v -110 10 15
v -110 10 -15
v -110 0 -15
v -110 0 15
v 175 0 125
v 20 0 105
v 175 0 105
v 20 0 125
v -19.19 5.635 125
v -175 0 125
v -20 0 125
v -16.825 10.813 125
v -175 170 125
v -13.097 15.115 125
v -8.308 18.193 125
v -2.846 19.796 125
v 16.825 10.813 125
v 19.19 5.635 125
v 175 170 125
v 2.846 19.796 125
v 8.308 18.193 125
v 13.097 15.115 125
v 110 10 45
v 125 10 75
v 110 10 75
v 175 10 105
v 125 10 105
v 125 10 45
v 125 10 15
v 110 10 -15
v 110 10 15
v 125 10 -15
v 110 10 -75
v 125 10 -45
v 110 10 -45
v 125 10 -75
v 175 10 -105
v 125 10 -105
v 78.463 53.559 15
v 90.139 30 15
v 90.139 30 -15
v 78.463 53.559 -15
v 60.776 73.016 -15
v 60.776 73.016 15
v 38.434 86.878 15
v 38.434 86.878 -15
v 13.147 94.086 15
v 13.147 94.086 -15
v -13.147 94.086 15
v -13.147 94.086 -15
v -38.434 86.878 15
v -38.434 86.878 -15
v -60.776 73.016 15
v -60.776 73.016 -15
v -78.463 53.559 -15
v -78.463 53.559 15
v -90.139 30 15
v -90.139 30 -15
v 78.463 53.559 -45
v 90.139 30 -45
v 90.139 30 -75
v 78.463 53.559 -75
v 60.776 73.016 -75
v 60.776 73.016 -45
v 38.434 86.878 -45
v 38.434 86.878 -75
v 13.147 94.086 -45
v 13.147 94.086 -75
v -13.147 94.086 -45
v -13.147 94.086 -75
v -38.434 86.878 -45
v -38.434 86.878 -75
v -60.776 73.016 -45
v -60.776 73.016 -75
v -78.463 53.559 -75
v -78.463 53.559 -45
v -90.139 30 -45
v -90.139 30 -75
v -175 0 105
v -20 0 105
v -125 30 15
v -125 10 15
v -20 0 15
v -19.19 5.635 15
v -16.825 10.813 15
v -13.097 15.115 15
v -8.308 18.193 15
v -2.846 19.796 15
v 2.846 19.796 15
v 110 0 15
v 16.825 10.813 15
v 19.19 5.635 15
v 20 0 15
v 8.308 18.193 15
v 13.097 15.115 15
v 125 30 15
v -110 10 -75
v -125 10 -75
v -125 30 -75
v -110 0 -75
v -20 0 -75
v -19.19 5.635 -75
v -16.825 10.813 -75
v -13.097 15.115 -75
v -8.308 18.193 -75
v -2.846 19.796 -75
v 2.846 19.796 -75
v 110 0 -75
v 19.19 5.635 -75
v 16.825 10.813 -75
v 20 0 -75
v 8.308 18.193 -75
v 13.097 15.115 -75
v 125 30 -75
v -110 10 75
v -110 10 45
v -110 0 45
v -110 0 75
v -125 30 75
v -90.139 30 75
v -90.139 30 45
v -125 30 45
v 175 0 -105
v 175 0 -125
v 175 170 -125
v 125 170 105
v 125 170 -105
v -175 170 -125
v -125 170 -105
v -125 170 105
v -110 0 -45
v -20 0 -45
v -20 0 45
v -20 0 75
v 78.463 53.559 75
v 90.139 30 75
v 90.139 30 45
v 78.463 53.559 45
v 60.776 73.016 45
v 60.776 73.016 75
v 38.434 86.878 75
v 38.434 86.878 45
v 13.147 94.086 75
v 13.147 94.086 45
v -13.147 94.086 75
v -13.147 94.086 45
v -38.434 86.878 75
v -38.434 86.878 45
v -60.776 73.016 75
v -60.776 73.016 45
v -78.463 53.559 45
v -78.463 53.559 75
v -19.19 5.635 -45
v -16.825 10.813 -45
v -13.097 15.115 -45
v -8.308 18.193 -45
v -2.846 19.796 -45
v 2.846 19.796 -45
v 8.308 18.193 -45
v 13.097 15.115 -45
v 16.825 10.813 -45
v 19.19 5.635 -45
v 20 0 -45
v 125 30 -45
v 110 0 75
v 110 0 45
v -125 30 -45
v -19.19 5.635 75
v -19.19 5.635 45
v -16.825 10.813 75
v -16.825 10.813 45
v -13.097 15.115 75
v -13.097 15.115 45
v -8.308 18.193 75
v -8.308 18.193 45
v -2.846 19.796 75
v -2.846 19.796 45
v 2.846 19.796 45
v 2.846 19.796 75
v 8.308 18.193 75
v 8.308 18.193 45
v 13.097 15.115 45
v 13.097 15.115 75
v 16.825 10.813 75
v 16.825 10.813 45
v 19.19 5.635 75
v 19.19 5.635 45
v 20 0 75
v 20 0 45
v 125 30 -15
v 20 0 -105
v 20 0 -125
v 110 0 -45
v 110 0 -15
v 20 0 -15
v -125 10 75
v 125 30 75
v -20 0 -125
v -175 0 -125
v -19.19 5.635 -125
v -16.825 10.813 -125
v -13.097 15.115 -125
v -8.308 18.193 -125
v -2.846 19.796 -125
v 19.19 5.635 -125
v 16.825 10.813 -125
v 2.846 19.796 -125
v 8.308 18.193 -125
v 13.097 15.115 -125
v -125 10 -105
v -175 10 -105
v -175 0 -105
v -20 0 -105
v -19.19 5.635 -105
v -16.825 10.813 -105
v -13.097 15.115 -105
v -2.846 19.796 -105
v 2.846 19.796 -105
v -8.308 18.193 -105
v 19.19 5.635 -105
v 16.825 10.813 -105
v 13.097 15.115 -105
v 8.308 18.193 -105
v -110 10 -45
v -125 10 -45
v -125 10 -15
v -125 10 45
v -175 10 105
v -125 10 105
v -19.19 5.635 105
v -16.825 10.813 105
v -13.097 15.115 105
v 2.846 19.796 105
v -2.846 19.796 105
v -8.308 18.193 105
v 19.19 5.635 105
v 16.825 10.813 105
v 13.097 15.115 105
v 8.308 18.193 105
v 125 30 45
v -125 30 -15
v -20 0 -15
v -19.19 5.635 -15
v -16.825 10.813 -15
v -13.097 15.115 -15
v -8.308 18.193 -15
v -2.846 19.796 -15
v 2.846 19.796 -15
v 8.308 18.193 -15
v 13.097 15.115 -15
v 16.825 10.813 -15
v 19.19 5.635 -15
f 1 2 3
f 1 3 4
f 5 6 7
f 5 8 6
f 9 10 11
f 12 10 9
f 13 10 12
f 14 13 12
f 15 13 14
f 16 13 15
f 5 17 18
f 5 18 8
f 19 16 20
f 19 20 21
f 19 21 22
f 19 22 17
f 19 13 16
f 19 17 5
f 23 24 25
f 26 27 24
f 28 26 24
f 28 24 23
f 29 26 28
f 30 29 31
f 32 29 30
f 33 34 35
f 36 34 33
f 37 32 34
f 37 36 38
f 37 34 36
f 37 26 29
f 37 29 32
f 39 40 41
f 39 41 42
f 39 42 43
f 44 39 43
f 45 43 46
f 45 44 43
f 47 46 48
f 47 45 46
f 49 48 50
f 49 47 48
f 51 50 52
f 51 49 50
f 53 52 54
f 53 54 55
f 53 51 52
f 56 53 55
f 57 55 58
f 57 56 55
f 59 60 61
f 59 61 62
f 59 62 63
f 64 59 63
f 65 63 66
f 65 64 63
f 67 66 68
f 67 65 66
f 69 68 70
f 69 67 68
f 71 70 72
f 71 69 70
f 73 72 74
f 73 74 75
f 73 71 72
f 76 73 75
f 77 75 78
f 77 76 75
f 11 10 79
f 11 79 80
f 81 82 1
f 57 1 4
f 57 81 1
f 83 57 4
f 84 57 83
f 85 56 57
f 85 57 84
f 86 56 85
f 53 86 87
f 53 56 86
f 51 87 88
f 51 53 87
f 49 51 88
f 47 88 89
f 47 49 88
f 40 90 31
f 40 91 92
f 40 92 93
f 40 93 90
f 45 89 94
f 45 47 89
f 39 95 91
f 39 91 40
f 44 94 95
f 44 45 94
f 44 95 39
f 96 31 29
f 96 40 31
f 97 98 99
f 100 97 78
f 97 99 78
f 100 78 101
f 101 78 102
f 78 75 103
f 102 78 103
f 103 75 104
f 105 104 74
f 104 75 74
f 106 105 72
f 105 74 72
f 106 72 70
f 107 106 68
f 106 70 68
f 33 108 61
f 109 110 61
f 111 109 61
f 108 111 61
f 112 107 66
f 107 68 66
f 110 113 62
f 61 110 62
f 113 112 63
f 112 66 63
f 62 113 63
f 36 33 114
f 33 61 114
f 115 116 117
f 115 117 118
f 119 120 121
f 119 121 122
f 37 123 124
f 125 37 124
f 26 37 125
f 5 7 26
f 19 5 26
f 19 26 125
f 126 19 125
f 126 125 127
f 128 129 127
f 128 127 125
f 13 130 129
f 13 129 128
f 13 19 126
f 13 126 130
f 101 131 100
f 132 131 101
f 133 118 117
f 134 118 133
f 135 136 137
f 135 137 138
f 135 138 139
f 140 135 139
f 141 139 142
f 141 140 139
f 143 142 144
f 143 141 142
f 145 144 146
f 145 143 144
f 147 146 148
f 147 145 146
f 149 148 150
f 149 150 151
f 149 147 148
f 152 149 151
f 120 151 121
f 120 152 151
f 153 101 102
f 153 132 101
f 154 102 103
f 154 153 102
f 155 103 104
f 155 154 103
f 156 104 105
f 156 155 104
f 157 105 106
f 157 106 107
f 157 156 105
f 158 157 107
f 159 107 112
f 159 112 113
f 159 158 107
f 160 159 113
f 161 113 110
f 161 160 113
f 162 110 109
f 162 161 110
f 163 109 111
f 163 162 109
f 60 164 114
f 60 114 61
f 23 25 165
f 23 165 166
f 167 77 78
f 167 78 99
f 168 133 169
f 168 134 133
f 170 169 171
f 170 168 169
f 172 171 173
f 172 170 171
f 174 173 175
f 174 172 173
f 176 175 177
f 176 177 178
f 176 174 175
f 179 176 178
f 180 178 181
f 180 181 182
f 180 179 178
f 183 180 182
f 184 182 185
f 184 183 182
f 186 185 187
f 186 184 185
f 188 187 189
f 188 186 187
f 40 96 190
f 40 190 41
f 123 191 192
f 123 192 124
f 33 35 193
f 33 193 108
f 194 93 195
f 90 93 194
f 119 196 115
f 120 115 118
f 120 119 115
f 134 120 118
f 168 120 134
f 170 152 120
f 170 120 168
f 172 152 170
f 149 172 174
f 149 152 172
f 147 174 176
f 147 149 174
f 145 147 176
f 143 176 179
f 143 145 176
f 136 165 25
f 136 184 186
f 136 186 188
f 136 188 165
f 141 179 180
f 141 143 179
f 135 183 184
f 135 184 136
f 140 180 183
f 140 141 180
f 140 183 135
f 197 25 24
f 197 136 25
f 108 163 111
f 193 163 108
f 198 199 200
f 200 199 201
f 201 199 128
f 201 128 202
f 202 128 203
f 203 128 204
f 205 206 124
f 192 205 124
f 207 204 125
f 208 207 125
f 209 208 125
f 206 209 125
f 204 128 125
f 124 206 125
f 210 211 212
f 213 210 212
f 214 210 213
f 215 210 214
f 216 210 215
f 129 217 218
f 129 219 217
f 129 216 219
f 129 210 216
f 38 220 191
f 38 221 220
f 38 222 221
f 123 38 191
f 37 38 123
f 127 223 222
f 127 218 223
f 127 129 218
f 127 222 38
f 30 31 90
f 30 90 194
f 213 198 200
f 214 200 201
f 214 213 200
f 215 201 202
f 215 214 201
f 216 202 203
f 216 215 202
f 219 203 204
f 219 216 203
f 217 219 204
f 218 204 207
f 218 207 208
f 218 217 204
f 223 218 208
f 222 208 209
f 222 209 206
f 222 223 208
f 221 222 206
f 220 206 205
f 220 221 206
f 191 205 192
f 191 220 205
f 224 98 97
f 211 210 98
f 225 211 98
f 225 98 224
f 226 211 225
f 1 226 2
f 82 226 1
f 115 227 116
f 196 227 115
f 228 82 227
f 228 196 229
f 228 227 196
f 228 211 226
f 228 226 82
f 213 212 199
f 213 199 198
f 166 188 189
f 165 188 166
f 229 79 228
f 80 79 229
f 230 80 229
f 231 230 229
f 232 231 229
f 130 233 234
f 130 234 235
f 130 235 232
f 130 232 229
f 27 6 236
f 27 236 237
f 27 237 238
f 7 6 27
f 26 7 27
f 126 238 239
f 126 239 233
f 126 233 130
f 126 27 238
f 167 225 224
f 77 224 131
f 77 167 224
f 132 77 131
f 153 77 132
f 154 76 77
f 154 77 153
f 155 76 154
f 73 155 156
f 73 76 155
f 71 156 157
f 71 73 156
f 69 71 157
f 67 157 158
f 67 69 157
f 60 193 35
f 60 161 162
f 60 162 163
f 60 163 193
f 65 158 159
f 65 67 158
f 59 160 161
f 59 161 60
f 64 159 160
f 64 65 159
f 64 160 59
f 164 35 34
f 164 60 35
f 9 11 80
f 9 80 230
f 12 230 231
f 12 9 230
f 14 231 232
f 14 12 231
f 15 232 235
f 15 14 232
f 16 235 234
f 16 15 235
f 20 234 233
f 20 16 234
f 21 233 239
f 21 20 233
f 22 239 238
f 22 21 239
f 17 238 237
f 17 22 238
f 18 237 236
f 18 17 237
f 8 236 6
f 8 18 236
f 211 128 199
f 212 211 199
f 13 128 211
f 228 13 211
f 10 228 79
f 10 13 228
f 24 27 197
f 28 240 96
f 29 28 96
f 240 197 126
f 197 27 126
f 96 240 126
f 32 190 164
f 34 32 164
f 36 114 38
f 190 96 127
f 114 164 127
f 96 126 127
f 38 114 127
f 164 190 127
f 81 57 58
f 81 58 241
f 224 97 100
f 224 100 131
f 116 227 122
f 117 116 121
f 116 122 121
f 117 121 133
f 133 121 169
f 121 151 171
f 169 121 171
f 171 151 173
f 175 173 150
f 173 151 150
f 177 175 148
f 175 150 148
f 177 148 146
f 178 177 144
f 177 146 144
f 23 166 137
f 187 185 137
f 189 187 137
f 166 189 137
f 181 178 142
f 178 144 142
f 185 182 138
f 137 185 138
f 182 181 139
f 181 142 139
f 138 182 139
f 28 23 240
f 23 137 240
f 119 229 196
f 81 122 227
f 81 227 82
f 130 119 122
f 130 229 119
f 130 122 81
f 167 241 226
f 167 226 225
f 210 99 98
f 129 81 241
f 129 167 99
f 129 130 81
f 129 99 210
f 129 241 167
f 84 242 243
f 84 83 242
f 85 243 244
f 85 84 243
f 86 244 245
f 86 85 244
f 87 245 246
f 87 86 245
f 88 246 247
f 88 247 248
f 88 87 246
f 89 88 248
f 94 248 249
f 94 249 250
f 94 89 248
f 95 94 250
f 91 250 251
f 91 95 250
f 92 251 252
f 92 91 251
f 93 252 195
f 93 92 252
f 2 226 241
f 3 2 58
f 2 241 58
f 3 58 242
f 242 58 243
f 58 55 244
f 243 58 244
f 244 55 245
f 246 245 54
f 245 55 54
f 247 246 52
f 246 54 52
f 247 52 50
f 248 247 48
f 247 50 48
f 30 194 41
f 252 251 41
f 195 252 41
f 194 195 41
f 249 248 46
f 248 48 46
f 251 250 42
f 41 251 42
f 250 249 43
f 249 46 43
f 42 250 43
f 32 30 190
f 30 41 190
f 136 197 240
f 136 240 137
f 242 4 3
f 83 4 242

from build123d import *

# Parameters (mm, degrees)
BOSS_EXTRUDE1_DEPTH = 125
SKETCH4_W           = 250
SKETCH4_H           = 210
CUT_EXTRUDE2_DEPTH  = 250
BOSS_EXTRUDE2_DEPTH = 15
LPATTERN1_COUNT     = 2
LPATTERN1_PITCH     = 60
LPATTERN1_COL_COUNT = 2
LPATTERN1_COL_PITCH = 60
SKETCH5_W           = 210
SKETCH5_H           = 10
CUT_EXTRUDE3_DEPTH  = 65
SKETCH6_W           = 210
SKETCH6_H           = 10
CUT_EXTRUDE4_DEPTH  = 65


with BuildPart() as part:
    # Sketch1 → Boss-Extrude1 (new, symmetric)
    with BuildSketch(Plane.XY):
        with BuildLine():
            Line((20, 0), (125, 0))
            Line((125, 0), (175, 0))
            Line((175, 0), (175, 170))
            Line((175, 170), (-175, 170))
            Line((-175, 170), (-175, 0))
            Line((-175, 0), (-125, 0))
            Line((-125, 0), (-20, 0))
            ThreePointArc((-20, 0), (0, 20), (20, 0))
        make_face()
    extrude(amount=BOSS_EXTRUDE1_DEPTH, both=True)

    # Sketch4 → Cut-Extrude2 (cut)
    with BuildSketch(Plane(origin=(0, 170, 0), x_dir=(1, 0, 0), z_dir=(0, 1, 0))):
        Rectangle(SKETCH4_W, SKETCH4_H)
    extrude(amount=-CUT_EXTRUDE2_DEPTH, mode=Mode.SUBTRACT)

    # Sketch3 → Boss-Extrude2 (add, symmetric)
    with BuildSketch(Plane.XY):
        with BuildLine():
            Line((125, 0), (125, 30))
            Line((125, 30), (90.138781887, 30))
            ThreePointArc((90.138781887, 30), (0, 95), (-90.138781887, 30))
            Line((-90.138781887, 30), (-125, 30))
            Line((-125, 30), (-125, 0))
            Line((-125, 0), (-20, 0))
            ThreePointArc((-20, 0), (0, 20), (20, 0))
            Line((20, 0), (125, 0))
        make_face()
    boss_extrude2 = extrude(amount=BOSS_EXTRUDE2_DEPTH, both=True)

    # LPattern1: Boss-Extrude2 ×2
    with Locations(*[(0, 0, i * LPATTERN1_PITCH) for i in range(1, LPATTERN1_COUNT)]):
        add(boss_extrude2)

    # LPattern1 col: Boss-Extrude2 ×2
    with Locations(*[(0, 0, -i * LPATTERN1_COL_PITCH) for i in range(1, LPATTERN1_COL_COUNT)]):
        add(boss_extrude2)

    # Sketch5 → Cut-Extrude3 (cut)
    with BuildSketch(Plane(origin=(175, 0, 0), x_dir=(0, 0, -1), z_dir=(1, 0, 0))):
        with Locations((0, 5)):
            Rectangle(SKETCH5_W, SKETCH5_H)
    extrude(amount=-CUT_EXTRUDE3_DEPTH, mode=Mode.SUBTRACT)

    # Sketch6 → Cut-Extrude4 (cut)
    with BuildSketch(Plane.ZY.offset(175)):
        with Locations((0, 5)):
            Rectangle(SKETCH6_W, SKETCH6_H)
    extrude(amount=-CUT_EXTRUDE4_DEPTH, mode=Mode.SUBTRACT)


solid = part.part
